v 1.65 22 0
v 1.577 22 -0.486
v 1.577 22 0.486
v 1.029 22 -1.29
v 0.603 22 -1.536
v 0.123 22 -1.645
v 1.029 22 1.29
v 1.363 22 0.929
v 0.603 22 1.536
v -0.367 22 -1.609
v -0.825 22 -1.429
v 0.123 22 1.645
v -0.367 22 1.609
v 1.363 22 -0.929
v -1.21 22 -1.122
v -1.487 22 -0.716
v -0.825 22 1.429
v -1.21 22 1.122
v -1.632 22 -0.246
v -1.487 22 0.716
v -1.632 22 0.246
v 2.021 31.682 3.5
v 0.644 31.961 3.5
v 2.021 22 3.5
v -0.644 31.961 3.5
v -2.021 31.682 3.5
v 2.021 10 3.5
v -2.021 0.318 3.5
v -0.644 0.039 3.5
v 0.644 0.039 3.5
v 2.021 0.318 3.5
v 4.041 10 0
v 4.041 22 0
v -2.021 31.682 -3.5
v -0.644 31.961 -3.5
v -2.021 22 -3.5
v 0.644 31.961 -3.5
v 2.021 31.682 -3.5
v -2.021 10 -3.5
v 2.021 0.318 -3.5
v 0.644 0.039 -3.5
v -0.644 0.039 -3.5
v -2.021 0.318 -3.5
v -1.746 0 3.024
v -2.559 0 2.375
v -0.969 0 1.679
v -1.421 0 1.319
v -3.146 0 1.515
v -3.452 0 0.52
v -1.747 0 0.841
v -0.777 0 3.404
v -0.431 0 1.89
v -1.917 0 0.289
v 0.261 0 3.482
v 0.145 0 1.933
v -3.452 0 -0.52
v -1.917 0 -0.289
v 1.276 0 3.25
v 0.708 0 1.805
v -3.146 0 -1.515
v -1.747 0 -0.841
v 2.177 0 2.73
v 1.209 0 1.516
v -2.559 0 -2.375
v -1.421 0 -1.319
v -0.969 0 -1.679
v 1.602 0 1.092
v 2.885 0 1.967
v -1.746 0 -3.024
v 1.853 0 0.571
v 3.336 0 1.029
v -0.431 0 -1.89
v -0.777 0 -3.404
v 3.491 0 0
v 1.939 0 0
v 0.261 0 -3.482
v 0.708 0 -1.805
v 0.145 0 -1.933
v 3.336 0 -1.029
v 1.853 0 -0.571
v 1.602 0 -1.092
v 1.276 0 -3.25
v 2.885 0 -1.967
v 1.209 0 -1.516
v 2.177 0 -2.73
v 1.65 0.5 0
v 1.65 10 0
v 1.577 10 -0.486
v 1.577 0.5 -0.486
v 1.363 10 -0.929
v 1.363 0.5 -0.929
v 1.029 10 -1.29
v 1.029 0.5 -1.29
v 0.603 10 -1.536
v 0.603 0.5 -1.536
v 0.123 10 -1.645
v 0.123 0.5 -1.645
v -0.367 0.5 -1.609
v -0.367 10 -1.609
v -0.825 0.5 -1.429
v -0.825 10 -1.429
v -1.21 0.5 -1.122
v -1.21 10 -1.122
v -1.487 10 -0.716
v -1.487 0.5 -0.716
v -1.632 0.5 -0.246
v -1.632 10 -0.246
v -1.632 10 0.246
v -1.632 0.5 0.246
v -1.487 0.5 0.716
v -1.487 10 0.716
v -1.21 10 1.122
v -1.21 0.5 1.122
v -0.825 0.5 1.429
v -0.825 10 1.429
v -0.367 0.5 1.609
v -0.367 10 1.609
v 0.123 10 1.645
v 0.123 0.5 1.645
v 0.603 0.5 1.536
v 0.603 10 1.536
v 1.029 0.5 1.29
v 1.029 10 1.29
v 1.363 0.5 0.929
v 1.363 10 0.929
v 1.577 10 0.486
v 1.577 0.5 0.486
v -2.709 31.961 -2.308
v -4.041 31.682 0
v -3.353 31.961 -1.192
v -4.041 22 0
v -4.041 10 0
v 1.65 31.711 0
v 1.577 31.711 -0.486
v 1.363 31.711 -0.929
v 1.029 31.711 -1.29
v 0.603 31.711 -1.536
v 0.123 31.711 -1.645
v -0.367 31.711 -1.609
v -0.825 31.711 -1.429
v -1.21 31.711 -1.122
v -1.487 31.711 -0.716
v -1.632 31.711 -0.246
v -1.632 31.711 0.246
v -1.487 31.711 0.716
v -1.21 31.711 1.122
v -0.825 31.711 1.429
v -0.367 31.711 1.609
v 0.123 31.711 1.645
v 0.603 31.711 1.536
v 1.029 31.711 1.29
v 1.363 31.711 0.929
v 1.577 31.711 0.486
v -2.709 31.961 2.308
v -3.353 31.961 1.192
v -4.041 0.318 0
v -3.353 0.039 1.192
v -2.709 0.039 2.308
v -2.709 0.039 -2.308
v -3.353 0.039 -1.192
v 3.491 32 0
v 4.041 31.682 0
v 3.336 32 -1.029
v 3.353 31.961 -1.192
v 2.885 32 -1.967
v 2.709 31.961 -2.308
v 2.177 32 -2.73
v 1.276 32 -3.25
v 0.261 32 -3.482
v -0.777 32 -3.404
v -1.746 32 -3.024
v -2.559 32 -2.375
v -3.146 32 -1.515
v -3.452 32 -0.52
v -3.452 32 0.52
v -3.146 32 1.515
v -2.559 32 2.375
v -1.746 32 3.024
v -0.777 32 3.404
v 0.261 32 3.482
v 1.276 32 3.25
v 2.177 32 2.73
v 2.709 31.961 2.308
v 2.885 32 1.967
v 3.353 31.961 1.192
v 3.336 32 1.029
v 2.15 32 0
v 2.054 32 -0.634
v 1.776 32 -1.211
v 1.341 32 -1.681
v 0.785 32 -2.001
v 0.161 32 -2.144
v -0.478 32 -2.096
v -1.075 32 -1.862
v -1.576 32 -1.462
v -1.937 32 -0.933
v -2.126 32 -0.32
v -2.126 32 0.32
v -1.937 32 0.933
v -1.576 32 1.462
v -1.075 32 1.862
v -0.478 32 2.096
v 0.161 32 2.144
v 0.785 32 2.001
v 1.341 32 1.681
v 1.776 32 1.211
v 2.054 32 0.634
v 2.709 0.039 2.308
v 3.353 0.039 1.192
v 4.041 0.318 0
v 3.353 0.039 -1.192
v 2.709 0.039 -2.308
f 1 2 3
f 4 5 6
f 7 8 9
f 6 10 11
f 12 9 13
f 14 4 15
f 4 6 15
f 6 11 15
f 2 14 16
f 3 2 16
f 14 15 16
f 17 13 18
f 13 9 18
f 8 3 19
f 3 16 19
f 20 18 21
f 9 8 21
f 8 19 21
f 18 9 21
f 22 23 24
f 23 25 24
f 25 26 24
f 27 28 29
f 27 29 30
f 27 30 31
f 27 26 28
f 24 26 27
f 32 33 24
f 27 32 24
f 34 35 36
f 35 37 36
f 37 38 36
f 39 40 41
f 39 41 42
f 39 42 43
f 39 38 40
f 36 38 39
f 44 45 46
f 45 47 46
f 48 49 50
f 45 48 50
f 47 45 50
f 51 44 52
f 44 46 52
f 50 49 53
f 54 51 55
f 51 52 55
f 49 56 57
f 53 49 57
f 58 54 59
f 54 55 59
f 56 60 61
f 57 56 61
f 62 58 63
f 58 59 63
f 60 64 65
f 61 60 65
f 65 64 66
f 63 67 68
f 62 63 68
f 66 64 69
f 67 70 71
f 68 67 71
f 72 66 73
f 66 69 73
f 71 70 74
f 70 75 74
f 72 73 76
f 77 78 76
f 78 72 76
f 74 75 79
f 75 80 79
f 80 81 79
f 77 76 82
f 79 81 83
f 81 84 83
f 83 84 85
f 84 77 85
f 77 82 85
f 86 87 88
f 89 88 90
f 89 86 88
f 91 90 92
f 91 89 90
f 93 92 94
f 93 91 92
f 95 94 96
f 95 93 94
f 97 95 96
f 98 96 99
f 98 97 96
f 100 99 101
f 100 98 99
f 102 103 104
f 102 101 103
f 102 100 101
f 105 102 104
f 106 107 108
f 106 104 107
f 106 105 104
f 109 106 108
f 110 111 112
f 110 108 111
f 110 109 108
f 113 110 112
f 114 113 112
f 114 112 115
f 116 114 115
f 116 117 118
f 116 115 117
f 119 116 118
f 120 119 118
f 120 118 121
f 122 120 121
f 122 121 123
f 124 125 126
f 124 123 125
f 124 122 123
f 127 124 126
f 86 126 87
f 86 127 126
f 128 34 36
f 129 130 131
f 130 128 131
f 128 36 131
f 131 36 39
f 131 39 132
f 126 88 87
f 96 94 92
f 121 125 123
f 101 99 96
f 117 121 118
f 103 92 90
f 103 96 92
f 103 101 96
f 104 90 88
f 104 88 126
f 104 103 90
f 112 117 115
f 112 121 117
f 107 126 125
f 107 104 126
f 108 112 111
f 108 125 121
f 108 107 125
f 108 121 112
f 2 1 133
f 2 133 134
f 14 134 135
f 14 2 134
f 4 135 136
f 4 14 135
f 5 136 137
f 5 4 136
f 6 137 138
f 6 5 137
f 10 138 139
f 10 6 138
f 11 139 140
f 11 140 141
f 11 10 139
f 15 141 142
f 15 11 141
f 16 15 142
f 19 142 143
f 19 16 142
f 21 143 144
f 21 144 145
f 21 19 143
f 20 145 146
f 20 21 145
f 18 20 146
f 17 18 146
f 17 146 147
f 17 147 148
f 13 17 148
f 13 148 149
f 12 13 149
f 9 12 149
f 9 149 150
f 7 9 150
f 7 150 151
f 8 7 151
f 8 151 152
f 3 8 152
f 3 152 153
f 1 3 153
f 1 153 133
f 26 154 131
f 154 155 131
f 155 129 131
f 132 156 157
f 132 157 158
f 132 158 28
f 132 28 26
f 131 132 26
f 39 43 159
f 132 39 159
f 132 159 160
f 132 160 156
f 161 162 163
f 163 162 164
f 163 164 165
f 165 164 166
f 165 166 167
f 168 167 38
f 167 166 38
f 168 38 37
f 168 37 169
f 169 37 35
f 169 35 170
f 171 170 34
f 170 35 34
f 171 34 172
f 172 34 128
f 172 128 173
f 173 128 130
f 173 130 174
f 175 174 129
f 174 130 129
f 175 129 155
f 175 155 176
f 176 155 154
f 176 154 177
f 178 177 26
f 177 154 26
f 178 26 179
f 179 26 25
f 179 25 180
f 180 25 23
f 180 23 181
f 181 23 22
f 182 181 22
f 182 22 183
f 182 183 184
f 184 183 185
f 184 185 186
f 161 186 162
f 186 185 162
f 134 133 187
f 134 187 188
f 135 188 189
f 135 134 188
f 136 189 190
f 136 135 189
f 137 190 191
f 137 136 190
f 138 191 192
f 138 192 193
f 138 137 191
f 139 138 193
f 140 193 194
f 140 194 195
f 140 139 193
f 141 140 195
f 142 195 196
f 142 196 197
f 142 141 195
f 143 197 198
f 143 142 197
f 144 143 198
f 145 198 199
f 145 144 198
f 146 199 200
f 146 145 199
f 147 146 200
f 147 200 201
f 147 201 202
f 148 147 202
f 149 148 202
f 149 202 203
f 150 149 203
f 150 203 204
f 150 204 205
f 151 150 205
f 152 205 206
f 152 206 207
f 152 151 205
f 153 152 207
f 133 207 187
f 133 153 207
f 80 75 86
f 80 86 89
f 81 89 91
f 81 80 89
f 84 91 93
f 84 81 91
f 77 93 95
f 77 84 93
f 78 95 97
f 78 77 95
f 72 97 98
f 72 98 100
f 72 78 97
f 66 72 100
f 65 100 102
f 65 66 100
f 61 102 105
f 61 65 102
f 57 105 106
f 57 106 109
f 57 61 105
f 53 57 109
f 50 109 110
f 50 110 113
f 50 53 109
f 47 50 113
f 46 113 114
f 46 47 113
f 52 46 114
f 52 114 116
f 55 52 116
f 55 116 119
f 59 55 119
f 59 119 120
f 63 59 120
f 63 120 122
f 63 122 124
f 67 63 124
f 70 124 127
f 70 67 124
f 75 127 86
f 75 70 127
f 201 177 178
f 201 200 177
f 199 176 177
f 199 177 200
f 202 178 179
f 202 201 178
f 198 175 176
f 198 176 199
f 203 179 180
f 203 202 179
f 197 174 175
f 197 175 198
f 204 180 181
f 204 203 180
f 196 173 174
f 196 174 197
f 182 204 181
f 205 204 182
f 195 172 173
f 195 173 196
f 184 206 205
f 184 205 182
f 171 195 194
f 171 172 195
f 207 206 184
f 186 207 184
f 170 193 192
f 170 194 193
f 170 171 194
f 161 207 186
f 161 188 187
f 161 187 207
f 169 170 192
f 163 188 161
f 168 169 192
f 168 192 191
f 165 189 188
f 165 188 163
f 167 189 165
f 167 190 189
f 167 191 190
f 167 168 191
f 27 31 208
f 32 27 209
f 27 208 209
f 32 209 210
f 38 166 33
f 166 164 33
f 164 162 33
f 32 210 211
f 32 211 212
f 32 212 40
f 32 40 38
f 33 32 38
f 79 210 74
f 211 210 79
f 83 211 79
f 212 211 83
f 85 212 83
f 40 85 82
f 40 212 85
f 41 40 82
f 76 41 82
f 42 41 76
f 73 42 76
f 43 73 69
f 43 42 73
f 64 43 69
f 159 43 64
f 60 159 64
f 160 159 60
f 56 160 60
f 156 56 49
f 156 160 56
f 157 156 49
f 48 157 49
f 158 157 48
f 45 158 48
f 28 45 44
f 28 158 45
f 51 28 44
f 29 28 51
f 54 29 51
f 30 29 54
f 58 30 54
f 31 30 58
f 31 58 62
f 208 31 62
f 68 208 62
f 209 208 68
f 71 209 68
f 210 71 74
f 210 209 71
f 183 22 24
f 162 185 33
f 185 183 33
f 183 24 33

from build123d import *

# Parameters (mm, degrees)
SKETCH1_R             = 4.041451884
SKETCH1_R_2           = 1.65
BOSS_EXTRUDE1_DEPTH   = 32
CHAMFER1_SIZE         = 0.55
CHAMFER1_SIZE2        = 0.317542648
CHAMFER2_SIZE         = 0.55
CHAMFER2_SIZE2        = 0.317542648
SKETCH2_OUTSIDE_W     = 16.878
SKETCH2_OUTSIDE_H     = 16.878
CUT_EXTRUDE1_DEPTH    = 33
CHAMFER3_SIZE         = 0.5
CHAMFER3_SIZE2        = 0.288675135
CHAMFER3_PART_2_SIZE  = 0.5
CHAMFER3_PART_2_SIZE2 = 0.288675135
SKETCH3_W             = 4.041451884
SKETCH3_H             = 12
BOSS_EXTRUDE2_DEPTH   = 7


with BuildPart() as part:
    # Sketch1 → Boss-Extrude1 (new body)
    with BuildSketch(Plane(origin=(0, 0, 0), x_dir=(1, 0, 0), z_dir=(0, 1, 0))):
        Circle(SKETCH1_R)
        Circle(SKETCH1_R_2, mode=Mode.SUBTRACT)
    extrude(amount=BOSS_EXTRUDE1_DEPTH)

    # Chamfer1
    chamfer1_edges = [part.edges().sort_by_distance(p)[0] for p in [
        (-4.041451884, 32, 0),
    ]]
    chamfer1_side = [part.faces().sort_by_distance(p)[0] for p in [
        (-3.927142363, 32, 0),
    ]]
    chamfer(chamfer1_edges, length=CHAMFER1_SIZE, length2=CHAMFER1_SIZE2, reference=chamfer1_side[0])

    # Chamfer2
    chamfer2_edges = [part.edges().sort_by_distance(p)[0] for p in [
        (-4.041451884, 0, 0),
    ]]
    chamfer2_side = [part.faces().sort_by_distance(p)[0] for p in [
        (-3.927142363, 0, 0),
    ]]
    chamfer(chamfer2_edges, length=CHAMFER2_SIZE, length2=CHAMFER2_SIZE2, reference=chamfer2_side[0])

    # Sketch2 outside → Cut-Extrude1 (cut, through all)
    with BuildSketch(Plane.XZ):
        Rectangle(SKETCH2_OUTSIDE_W, SKETCH2_OUTSIDE_H)
        Polygon((4.041451884, 0), (2.020725942, -3.5), (-2.020725942, -3.5), (-4.041451884, 0), (-2.020725942, 3.5), (2.020725942, 3.5), align=None, mode=Mode.SUBTRACT)
    extrude(amount=-CUT_EXTRUDE1_DEPTH, mode=Mode.SUBTRACT)

    # Chamfer3
    chamfer3_edges = [part.edges().sort_by_distance(p)[0] for p in [
        (-1.65, 0, 0),
    ]]
    chamfer3_side = [part.faces().sort_by_distance(p)[0] for p in [
        (-1.65, 16, 0),
    ]]
    chamfer(chamfer3_edges, length=CHAMFER3_SIZE, length2=CHAMFER3_SIZE2, reference=chamfer3_side[0])

    # Chamfer3 part 2
    chamfer3_part_2_edges = [part.edges().sort_by_distance(p)[0] for p in [
        (-1.65, 32, 0),
    ]]
    chamfer3_part_2_side = [part.faces().sort_by_distance(p)[0] for p in [
        (-3.392698712, 32, 0),
    ]]
    chamfer(chamfer3_part_2_edges, length=CHAMFER3_PART_2_SIZE, length2=CHAMFER3_PART_2_SIZE2, reference=chamfer3_part_2_side[0])

    # Sketch3 → Boss-Extrude2 (add)
    with BuildSketch(Plane(origin=(-3.031088913, 0, -1.75), x_dir=(-0.5, 0, 0.866025404), z_dir=(-0.866025404, 0, -0.5))):
        with Locations((0, 16)):
            Rectangle(SKETCH3_W, SKETCH3_H)
    extrude(amount=-BOSS_EXTRUDE2_DEPTH)


solid = part.part
